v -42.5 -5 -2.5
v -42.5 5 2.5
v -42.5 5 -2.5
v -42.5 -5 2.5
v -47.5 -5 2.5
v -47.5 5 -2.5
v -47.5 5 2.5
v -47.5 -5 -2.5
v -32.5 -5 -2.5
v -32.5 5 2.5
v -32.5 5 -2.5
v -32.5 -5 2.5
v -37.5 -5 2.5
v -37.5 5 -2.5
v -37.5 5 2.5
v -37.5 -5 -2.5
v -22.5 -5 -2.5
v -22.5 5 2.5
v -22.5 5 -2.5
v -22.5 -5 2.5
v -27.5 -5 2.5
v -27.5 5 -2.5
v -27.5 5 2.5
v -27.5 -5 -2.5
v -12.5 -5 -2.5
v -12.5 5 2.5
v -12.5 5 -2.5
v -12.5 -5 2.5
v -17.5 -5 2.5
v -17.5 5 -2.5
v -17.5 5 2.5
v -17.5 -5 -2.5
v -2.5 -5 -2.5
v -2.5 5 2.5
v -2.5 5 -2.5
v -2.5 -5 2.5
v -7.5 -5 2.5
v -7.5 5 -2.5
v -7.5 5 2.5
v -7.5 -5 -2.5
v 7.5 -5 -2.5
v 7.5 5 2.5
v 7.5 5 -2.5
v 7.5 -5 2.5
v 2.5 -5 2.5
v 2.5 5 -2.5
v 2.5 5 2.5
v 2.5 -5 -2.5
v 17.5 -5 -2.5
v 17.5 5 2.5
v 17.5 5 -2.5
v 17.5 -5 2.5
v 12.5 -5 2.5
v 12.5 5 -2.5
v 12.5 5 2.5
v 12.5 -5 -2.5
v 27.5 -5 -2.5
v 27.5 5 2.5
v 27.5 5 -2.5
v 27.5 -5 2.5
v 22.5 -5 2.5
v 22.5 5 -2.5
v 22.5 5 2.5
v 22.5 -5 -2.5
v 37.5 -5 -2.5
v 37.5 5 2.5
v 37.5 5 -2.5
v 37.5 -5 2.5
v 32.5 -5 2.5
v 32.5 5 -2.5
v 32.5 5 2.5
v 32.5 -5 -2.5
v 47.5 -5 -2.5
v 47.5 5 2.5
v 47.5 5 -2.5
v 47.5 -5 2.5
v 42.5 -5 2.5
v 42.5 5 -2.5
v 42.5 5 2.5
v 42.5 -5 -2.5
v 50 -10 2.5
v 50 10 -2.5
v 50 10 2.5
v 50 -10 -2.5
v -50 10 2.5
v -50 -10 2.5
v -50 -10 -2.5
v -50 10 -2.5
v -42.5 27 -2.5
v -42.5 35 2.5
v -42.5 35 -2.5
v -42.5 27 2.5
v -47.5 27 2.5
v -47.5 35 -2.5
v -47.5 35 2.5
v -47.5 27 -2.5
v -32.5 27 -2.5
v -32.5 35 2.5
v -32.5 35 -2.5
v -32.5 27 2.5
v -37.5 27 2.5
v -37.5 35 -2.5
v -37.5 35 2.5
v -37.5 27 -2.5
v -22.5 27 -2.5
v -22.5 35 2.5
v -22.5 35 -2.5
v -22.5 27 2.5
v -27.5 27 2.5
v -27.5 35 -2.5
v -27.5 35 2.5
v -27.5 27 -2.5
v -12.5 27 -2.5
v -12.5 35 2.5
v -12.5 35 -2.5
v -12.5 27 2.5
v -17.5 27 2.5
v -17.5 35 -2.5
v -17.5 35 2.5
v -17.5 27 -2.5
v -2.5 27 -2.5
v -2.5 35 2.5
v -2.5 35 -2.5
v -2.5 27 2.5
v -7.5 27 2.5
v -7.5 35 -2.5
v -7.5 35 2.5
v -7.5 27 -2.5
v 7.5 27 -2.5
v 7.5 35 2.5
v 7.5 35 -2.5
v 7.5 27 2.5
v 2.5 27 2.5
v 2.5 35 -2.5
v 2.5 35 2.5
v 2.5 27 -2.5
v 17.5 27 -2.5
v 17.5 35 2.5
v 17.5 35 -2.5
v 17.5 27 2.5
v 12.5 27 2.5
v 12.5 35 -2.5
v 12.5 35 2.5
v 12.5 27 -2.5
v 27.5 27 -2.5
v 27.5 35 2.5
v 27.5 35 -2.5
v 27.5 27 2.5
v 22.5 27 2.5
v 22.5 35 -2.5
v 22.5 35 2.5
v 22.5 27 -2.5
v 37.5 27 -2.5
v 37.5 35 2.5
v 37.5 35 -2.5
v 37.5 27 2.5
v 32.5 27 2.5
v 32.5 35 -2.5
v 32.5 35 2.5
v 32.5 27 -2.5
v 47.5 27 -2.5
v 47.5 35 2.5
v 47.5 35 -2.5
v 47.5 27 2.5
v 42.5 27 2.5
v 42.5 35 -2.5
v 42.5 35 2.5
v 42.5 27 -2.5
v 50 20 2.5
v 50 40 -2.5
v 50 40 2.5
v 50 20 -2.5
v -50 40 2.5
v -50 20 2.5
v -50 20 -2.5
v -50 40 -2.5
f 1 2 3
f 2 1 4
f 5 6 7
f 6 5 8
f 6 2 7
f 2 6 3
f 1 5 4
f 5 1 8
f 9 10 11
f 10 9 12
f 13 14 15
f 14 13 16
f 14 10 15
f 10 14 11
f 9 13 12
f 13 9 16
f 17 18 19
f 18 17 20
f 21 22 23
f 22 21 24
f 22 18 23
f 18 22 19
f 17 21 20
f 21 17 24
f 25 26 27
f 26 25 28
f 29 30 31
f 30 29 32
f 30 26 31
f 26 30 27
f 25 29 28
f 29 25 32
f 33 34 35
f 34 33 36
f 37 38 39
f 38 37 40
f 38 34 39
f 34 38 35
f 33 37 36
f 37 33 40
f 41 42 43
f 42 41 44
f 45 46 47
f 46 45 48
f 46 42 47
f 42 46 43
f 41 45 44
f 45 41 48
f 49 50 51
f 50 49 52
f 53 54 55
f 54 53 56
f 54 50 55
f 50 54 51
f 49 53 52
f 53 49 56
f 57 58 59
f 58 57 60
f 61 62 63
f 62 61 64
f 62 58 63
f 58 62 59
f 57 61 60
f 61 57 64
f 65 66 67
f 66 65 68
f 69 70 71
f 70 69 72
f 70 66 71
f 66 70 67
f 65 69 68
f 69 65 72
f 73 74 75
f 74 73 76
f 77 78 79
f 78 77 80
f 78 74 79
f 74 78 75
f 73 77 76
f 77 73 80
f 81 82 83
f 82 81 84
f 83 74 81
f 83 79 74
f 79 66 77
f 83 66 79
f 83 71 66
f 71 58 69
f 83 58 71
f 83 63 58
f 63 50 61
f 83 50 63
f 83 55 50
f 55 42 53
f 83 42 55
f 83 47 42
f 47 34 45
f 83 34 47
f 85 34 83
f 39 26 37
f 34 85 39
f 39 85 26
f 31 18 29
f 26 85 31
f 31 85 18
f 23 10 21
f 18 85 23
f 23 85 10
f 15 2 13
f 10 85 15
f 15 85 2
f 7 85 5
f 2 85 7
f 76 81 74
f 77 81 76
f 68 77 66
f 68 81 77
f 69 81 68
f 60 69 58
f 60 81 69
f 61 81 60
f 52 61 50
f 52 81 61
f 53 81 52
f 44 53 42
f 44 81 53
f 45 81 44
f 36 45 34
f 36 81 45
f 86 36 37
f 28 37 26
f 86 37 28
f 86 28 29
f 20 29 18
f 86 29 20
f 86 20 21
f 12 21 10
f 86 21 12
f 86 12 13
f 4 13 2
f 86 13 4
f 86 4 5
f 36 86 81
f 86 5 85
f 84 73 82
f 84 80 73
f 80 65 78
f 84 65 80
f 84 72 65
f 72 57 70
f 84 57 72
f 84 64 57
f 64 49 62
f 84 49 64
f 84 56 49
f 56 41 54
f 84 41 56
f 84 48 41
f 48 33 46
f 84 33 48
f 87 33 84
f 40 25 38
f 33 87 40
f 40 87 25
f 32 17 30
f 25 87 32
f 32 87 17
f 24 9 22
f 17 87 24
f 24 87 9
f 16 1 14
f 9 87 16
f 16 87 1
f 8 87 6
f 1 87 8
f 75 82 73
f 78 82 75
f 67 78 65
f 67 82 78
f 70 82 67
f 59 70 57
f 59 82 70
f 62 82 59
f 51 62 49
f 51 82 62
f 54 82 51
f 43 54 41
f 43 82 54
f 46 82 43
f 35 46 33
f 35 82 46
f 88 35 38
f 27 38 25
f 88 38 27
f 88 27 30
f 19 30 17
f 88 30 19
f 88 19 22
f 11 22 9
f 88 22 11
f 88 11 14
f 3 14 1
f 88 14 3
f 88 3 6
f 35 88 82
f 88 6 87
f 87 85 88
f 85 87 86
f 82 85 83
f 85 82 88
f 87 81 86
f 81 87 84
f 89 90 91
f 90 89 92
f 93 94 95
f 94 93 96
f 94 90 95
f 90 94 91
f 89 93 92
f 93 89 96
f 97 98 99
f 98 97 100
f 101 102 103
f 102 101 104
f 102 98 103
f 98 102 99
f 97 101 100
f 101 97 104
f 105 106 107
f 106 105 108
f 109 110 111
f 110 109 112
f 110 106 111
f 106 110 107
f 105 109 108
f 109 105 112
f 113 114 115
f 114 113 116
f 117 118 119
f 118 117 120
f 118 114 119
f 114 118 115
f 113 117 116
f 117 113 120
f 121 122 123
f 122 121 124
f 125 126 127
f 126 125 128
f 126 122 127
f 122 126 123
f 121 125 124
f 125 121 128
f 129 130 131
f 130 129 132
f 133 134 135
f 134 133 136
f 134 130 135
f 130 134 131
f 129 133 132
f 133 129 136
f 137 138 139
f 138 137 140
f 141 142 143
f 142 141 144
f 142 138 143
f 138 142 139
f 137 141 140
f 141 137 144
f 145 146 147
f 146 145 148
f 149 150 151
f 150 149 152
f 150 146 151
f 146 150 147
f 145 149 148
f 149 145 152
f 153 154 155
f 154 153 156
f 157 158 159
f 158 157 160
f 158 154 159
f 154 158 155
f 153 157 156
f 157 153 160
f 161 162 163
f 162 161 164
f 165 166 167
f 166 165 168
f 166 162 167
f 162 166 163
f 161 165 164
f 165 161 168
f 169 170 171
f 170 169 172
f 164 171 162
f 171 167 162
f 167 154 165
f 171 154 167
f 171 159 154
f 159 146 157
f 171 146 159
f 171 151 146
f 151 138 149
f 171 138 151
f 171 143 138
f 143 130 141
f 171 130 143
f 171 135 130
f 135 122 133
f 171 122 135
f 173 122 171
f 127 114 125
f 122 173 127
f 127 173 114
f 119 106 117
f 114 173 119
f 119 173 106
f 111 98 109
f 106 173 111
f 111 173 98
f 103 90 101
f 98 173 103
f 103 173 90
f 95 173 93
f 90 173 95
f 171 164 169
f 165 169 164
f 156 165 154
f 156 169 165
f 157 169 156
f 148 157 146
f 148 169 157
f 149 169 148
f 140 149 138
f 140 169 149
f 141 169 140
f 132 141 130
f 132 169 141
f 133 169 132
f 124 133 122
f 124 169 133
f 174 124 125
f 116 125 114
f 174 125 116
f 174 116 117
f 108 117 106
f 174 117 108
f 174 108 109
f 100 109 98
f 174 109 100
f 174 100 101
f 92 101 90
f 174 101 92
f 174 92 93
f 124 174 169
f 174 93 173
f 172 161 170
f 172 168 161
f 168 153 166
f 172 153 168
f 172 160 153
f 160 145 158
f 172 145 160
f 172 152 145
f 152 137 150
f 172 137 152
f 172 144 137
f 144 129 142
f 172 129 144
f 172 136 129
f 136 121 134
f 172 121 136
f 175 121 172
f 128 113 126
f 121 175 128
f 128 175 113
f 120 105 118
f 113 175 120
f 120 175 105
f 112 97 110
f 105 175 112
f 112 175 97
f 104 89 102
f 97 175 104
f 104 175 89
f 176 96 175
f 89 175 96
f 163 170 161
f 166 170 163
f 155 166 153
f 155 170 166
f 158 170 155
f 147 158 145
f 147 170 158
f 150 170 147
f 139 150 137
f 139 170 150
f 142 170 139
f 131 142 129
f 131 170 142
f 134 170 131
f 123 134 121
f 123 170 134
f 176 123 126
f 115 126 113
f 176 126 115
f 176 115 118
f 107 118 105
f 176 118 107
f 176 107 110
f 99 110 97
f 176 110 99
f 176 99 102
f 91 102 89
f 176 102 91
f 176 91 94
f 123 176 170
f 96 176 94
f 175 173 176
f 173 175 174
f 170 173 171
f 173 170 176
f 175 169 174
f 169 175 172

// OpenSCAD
/*
 * This code is licensed under the CC BY-NC-SA 4.0 (Attribution-NonCommercial-ShareAlike).
 * Please read LICENCE.md for full details.
 *
 * A set of modules for creating bolt holes at specific sizes
 *
 * All of these modules will render flat on the XY plane and centered on the origin.
 * Heights are measured along the Y axis.
 * Widths are measured along the X axis.
 * Thickness are measured along the Z axis.
 */

/*
 * M mounting hole. Radius is (Msize/2) + 0.25mm
 * The 0.5mm gives some extra room so the bolt does not get restricted by the plastic & is free to move.
 *
 * size The size of the hole, e.g. 4 for a M4 bolt
 * t    The thickness of the material the hole is in
 */
module MHole(size,t) {
    translate([0, 0, -1]) cylinder( r=(size/2)+.5, h=t+2, $fn=80);
}

/*
 * A rectangular slotted hole for bolts, used so there's some directional movement in attaching something.
 *
 * boltSize     The diameter of the bolt this slot is to fit. 0.5mm either side will be included in the slot
 * height       The height of the slot in mm
 * thickness    The thickness of the material the slot is to cut out.
 */
 module BoltSlot( boltSize,height, thickness) {
    translate([-(boltSize+1)/2,-height/2,-(thickness+1)/2])
        cube([boltSize+1, height, thickness+1]);
 }

/*
 * A bar with multiple slots cut out of it
 *
 * width The width of the bar
 * height The height of the bar
 * thickness The thickness of the bar
 * boltSize The size of bolt that will be used in the slot, remember slots are 10mm apart!
 * baseOffset The offset from the bottom to the bottom of the slot
 * topOffset The offset from the top of the slot from the top of the bar
 */
module SlottedBar(width, height, thickness, boltSize, baseOffset, topOffset) {
    bo = baseOffset <=0 ? thickness : baseOffset;
    to = topOffset <= 0 ? thickness : topOffset;
    
    // Y offset to middle of slot
    dy = baseOffset + ((height-baseOffset-topOffset)/2);
    
    // last slot index that fits, first slot is #0
    numSlots = floor(width/10)-1;
    
    translate([-width/2, -height/2, -thickness/2])
        difference() {
            // Actual bar
            cube([width, height, thickness]);
            for( n = [0:numSlots] ) {
                translate([ 5+(10*n), dy, thickness/2 ])
                    BoltSlot( boltSize, height-baseOffset-topOffset, thickness );
            }
        }
}

SlottedBar( 100, 20, 5, 4, 5, 5 );

translate([0,30,0])
SlottedBar( 100, 20, 5, 4, 7, 5 );

//BoltSlot( 4, 20, 5);
